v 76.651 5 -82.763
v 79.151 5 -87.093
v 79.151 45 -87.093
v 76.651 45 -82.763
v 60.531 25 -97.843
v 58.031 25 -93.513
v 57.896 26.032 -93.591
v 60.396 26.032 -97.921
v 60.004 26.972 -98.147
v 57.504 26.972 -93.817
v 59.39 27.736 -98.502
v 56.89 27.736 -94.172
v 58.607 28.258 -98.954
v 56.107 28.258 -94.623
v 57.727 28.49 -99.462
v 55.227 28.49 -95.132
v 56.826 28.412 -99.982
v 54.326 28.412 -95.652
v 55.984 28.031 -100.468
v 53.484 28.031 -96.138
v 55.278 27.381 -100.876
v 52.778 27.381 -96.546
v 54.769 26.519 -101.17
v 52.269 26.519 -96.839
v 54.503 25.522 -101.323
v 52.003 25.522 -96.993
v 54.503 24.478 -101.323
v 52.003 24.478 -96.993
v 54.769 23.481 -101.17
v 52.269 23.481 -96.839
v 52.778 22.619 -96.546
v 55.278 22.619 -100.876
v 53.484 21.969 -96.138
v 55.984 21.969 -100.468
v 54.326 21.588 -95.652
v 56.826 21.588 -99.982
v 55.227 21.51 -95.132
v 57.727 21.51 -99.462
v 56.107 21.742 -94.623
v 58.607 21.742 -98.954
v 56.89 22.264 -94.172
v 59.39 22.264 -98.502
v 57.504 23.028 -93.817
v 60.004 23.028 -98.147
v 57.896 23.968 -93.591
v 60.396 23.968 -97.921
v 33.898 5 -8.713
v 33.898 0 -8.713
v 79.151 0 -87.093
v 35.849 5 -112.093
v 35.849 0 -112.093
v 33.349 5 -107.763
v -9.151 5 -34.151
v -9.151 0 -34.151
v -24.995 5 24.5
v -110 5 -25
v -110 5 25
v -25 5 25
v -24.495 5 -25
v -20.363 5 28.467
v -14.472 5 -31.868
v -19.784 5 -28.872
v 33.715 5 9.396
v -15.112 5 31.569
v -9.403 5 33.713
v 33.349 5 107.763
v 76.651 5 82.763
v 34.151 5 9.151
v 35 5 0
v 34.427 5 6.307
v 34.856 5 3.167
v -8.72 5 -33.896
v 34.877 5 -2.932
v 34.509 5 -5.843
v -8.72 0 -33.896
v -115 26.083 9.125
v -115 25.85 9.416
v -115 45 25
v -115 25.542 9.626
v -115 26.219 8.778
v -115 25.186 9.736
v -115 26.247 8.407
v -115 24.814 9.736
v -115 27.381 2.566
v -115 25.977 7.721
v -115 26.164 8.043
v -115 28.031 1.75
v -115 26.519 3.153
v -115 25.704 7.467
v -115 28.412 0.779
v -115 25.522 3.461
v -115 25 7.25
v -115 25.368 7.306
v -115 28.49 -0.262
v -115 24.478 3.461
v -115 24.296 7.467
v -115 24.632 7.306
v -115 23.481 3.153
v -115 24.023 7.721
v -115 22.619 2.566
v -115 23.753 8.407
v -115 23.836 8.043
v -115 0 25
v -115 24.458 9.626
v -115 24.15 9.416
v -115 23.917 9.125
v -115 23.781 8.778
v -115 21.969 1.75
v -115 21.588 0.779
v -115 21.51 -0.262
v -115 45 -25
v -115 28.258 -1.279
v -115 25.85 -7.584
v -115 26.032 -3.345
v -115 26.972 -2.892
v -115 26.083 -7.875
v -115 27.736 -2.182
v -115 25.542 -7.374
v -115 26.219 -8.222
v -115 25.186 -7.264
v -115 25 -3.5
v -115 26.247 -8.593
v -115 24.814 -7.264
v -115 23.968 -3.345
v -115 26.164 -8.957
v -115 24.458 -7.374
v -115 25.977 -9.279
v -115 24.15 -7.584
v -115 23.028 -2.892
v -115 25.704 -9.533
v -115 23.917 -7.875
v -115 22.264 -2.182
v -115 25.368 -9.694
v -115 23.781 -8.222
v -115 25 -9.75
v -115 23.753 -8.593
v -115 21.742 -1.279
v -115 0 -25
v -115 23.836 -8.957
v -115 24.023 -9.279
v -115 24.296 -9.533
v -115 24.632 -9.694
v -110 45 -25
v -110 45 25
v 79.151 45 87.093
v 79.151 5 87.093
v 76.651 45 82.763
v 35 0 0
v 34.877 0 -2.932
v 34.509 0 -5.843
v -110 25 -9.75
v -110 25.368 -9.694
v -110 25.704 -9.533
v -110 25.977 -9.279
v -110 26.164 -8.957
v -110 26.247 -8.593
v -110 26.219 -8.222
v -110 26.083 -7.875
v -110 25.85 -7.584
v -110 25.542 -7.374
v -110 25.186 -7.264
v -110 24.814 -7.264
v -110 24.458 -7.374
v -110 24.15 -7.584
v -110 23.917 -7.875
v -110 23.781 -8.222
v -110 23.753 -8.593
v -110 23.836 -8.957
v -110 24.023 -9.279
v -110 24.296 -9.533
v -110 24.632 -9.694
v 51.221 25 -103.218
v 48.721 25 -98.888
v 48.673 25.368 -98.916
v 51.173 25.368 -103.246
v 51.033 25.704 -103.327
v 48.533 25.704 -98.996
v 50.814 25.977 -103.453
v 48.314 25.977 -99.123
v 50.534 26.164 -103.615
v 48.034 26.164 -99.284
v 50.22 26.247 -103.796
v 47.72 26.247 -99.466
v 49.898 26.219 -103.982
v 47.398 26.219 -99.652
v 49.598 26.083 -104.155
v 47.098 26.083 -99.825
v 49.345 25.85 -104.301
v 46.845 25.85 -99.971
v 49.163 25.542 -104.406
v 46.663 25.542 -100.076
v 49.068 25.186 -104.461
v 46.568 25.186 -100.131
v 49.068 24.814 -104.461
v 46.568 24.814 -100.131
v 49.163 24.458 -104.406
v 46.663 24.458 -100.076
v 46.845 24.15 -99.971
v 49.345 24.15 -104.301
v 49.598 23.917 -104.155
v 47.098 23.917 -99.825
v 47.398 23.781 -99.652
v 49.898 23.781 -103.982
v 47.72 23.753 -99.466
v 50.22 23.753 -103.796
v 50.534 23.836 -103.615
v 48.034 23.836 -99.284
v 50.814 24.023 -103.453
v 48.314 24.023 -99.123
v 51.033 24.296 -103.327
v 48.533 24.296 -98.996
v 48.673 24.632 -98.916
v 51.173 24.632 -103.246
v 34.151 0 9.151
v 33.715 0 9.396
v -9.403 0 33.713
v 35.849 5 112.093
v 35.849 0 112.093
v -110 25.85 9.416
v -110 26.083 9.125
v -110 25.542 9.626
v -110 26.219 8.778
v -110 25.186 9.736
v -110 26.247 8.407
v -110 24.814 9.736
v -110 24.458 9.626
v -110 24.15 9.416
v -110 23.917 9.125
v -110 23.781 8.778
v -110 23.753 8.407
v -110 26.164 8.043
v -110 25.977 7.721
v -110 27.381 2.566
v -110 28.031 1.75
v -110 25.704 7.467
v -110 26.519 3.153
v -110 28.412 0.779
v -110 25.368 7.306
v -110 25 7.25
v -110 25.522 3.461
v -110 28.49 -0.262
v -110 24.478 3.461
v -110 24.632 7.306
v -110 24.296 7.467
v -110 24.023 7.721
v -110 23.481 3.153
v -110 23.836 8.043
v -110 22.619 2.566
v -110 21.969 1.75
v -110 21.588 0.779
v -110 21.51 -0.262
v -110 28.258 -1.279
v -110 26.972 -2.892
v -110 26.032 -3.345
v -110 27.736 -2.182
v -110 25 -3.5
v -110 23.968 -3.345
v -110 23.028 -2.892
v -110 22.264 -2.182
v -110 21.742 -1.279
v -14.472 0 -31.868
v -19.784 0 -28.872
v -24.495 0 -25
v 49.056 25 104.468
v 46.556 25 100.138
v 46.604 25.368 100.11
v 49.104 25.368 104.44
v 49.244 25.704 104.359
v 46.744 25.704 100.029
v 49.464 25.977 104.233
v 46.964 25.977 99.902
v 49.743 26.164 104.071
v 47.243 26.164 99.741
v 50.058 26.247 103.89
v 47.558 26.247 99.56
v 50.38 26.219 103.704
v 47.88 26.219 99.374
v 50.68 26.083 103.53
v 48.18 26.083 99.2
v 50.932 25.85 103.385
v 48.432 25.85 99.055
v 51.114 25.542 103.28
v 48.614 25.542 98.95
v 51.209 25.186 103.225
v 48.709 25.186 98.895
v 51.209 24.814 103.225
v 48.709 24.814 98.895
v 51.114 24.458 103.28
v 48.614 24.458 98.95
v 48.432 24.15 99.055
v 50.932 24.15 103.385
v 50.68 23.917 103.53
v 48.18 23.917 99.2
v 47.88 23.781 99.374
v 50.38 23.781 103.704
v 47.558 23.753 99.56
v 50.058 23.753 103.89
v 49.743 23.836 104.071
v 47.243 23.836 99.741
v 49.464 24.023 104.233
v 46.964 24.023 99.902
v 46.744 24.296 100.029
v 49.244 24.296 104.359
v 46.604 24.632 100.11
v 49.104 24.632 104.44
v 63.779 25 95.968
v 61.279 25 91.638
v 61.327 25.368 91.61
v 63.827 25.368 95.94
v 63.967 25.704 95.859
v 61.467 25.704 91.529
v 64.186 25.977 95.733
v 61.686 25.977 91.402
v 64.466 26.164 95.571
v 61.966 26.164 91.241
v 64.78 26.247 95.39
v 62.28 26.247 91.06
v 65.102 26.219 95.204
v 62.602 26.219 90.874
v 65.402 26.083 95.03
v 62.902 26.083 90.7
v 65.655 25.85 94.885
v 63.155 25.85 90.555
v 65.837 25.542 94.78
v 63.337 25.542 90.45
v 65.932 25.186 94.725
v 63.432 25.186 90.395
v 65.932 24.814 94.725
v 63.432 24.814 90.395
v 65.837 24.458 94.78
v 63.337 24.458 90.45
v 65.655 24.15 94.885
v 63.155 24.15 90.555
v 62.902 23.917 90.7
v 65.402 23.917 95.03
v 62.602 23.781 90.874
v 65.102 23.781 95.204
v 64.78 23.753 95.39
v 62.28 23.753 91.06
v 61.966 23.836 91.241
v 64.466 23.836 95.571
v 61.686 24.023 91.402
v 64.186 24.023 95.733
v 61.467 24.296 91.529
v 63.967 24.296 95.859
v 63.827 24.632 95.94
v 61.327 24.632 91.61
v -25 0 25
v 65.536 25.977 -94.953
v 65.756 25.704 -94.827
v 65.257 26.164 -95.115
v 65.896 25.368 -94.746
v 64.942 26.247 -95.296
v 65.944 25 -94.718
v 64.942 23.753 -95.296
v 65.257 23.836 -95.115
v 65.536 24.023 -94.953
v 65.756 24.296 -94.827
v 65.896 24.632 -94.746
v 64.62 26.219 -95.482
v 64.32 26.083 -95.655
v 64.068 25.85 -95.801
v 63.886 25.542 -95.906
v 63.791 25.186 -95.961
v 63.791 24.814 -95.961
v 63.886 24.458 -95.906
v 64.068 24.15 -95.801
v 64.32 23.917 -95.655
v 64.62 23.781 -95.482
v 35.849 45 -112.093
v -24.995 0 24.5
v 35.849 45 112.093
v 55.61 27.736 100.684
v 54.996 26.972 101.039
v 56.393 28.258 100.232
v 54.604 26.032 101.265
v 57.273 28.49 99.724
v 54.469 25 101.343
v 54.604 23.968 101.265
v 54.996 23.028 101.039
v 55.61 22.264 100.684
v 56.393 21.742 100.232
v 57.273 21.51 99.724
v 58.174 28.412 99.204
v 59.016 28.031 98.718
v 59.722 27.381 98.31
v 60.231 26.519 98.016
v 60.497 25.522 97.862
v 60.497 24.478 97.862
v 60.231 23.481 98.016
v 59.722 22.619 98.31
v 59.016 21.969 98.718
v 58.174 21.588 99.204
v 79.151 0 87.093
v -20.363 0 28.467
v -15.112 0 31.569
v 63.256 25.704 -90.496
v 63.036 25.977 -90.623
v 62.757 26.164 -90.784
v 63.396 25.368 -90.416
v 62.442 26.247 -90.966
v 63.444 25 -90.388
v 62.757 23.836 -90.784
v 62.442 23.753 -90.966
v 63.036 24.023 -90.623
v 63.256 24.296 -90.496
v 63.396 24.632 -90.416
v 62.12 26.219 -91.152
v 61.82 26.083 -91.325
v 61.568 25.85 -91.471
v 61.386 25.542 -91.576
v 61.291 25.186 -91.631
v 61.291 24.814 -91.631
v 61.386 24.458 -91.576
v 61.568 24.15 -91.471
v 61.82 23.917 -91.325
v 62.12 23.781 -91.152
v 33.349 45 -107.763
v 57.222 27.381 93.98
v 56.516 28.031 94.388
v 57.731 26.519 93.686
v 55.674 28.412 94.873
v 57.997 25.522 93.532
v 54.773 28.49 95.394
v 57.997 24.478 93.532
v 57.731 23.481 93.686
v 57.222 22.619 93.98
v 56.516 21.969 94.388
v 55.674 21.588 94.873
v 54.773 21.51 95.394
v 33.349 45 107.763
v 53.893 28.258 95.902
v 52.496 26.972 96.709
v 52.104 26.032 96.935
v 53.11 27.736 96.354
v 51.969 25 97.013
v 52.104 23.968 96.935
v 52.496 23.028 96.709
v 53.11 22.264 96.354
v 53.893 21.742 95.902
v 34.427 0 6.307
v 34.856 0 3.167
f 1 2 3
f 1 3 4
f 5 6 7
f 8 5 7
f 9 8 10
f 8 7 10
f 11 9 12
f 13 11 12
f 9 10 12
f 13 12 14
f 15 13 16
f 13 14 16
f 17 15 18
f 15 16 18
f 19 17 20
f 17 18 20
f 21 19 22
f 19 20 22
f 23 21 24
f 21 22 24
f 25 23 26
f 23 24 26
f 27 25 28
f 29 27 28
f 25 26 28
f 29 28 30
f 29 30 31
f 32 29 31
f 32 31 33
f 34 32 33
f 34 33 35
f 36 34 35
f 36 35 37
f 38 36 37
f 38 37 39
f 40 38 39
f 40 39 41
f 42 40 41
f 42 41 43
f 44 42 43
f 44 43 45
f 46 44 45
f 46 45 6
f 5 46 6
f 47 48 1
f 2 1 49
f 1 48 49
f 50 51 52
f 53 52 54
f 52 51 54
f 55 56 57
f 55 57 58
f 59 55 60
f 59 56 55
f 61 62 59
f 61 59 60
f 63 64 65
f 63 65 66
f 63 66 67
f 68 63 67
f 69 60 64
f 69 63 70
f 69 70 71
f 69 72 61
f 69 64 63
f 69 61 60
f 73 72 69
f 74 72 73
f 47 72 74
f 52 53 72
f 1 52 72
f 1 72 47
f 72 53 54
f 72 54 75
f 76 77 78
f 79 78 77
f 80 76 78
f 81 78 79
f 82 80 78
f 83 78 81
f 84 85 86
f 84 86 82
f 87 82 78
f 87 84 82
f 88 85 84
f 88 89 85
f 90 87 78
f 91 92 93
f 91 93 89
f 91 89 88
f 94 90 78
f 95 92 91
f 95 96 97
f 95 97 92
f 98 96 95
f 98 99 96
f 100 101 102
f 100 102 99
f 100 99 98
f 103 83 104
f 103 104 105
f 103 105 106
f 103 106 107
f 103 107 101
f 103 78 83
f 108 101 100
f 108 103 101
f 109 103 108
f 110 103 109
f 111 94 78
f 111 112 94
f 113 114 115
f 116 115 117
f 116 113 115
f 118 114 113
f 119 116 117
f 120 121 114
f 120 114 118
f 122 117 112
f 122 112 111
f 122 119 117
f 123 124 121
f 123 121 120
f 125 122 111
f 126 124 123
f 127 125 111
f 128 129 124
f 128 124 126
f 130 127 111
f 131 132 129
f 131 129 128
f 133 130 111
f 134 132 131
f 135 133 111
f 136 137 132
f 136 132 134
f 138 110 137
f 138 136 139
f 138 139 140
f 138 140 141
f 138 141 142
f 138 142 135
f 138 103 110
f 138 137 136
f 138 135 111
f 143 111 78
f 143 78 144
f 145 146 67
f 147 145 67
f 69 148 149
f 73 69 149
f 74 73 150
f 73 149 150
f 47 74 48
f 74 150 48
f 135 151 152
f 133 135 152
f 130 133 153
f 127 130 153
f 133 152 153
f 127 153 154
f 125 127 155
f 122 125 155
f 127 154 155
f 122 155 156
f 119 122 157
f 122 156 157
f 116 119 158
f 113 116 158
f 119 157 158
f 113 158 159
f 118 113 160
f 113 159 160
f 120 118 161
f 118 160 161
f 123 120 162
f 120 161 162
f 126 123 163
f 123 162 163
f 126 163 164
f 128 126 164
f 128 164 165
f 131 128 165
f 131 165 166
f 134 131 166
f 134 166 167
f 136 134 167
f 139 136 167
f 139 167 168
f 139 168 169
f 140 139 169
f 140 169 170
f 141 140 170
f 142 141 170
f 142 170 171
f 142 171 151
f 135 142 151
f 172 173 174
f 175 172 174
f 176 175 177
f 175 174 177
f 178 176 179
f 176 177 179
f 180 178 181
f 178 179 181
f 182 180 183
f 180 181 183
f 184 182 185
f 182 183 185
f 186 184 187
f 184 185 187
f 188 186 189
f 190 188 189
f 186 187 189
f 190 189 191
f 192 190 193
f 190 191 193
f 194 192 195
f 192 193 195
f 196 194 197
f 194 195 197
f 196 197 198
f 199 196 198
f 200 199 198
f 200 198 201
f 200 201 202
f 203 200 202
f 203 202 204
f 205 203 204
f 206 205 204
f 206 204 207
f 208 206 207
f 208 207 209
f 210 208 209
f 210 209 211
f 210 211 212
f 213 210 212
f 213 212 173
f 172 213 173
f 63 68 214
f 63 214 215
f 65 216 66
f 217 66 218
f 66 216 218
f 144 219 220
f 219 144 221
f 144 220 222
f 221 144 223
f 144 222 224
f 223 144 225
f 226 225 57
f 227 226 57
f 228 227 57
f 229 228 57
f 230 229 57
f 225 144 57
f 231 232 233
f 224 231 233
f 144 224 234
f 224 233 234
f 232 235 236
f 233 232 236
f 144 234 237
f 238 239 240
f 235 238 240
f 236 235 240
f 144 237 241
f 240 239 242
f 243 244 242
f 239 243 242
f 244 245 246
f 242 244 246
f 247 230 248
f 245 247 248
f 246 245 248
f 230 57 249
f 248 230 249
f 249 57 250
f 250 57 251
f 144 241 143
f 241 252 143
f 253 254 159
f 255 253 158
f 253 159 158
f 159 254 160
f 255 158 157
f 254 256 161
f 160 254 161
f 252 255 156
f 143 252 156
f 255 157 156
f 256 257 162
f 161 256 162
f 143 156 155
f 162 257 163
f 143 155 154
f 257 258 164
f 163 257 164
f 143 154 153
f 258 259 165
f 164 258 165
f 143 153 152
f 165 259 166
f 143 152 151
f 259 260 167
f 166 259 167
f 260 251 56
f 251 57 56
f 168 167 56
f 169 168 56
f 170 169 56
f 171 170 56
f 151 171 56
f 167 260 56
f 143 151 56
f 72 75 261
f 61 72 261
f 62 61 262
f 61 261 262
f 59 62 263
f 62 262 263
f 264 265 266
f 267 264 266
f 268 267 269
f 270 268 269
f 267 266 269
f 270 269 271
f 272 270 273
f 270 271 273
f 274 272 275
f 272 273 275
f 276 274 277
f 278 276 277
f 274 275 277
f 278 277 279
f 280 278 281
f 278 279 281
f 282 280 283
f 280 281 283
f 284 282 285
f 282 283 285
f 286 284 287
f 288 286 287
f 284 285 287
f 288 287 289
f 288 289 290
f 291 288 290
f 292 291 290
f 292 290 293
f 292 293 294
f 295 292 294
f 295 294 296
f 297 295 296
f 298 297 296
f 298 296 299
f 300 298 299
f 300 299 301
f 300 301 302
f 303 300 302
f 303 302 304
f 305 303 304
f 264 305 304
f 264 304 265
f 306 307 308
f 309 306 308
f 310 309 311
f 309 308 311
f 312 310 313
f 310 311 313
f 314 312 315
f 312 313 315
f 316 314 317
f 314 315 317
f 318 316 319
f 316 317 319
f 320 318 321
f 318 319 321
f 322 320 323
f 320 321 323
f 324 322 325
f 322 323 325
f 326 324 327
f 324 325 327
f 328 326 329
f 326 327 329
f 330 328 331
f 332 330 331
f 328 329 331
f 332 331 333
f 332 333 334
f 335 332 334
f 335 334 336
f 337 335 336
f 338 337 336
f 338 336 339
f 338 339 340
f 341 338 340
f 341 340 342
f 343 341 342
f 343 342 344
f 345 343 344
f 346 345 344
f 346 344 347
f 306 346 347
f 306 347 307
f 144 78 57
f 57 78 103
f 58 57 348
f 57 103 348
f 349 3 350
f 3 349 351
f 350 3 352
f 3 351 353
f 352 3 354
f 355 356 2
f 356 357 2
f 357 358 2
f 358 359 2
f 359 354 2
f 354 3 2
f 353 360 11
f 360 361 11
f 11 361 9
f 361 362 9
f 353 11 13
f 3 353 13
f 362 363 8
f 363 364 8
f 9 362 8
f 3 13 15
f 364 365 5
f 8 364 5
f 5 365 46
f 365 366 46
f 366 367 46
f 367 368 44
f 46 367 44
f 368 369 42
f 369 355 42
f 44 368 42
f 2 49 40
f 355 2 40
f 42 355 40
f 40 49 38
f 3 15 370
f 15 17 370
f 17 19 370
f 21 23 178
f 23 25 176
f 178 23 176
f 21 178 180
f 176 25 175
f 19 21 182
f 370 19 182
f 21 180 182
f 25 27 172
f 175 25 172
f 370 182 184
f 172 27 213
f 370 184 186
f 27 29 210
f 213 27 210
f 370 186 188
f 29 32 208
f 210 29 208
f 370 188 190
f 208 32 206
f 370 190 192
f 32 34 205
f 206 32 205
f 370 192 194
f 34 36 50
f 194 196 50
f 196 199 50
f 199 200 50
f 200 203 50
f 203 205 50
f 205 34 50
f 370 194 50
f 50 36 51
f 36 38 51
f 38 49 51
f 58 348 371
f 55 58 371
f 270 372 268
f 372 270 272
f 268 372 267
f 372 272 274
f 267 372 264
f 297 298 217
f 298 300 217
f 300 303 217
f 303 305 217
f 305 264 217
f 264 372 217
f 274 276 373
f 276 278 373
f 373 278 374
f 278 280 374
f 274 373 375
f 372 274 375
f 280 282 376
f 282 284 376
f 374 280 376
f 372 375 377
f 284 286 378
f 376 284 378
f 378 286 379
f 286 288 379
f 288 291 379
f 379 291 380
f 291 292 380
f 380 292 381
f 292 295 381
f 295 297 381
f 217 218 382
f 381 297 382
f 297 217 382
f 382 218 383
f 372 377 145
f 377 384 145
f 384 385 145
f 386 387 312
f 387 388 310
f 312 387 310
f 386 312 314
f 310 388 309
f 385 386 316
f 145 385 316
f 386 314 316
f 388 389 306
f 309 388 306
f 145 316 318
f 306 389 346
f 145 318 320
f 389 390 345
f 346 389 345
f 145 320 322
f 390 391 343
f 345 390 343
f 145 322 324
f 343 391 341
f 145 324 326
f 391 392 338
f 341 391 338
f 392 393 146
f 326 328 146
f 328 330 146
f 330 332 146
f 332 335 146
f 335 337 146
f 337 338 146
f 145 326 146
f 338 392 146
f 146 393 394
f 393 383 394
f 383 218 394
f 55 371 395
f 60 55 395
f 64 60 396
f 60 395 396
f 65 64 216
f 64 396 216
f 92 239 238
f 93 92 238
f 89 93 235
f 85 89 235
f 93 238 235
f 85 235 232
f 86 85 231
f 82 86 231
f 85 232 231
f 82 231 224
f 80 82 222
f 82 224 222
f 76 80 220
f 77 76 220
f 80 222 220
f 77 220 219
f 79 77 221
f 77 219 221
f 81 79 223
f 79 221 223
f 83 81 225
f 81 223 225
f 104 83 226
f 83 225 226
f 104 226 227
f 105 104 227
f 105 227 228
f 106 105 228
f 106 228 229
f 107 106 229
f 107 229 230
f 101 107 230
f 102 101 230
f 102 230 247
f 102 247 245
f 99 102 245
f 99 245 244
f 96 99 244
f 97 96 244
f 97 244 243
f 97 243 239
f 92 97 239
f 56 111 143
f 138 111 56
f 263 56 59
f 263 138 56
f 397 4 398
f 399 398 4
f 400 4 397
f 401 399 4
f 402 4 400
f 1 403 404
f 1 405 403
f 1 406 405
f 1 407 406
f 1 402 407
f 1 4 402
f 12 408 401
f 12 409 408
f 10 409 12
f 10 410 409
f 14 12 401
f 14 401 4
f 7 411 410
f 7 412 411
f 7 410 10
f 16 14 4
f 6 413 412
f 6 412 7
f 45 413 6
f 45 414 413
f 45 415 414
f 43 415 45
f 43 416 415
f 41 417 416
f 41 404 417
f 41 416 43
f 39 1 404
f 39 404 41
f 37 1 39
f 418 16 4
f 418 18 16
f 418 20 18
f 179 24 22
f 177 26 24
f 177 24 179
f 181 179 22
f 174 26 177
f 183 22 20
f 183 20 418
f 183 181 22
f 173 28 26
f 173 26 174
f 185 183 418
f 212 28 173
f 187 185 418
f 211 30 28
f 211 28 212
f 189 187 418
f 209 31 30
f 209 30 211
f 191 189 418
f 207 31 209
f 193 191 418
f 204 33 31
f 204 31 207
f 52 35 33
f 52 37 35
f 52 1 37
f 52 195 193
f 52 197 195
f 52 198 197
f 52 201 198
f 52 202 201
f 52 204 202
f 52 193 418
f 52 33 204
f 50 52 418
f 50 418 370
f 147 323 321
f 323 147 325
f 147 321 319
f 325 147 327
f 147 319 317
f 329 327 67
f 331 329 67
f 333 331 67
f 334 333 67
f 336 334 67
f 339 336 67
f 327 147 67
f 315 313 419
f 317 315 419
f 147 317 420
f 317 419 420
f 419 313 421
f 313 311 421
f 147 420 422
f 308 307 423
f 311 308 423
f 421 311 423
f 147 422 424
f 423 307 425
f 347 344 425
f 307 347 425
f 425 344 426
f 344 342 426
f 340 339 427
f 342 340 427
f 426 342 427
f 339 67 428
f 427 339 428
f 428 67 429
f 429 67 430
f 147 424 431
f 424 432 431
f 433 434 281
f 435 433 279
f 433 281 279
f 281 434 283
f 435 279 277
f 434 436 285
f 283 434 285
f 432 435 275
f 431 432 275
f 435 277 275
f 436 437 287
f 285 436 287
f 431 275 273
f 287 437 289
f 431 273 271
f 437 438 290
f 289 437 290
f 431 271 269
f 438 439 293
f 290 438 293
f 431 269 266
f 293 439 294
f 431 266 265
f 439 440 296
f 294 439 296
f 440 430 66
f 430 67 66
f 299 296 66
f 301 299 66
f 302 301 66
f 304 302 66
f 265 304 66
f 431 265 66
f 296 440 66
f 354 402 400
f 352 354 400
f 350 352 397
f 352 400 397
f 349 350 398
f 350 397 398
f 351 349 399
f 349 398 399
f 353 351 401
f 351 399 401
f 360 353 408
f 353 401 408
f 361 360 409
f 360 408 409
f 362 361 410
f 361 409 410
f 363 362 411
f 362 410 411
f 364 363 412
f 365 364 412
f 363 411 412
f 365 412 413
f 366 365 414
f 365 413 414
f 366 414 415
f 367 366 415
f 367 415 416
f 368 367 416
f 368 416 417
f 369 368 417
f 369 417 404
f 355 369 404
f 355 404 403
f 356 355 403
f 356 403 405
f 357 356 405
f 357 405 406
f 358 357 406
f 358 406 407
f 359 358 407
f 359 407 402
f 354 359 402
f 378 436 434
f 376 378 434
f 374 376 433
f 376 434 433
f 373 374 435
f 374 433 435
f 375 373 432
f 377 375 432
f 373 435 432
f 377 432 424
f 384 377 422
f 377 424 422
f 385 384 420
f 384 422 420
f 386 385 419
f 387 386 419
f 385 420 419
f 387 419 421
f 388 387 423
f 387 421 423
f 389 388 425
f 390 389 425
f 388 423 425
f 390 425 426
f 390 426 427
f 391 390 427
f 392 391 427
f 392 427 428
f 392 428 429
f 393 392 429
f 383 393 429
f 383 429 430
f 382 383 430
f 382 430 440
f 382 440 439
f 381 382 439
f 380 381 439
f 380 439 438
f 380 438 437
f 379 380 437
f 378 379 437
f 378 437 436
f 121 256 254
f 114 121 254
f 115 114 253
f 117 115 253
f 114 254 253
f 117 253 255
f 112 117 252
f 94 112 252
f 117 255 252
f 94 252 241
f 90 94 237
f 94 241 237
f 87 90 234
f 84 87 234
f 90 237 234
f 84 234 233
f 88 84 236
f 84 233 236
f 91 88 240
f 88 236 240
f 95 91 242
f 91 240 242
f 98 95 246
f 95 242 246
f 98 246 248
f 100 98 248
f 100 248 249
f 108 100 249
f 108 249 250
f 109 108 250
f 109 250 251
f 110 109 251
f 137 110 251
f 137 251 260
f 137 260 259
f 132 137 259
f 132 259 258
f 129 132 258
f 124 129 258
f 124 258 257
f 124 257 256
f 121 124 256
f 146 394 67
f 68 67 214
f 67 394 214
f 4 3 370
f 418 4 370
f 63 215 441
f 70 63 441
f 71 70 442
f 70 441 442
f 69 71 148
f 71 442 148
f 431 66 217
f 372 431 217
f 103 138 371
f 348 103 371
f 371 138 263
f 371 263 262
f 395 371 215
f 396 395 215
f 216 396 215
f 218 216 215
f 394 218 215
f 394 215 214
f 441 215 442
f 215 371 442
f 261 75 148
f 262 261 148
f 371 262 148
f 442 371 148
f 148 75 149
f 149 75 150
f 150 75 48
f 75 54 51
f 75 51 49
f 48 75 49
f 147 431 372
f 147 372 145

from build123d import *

# Parameters (mm, degrees)
BOSS_EXTRU_3_DEPTH      = 5
ESQUISSE4_W             = 5
ESQUISSE4_H             = 50
BOSS_EXTRU_4_DEPTH      = 40
ESQUISSE5_R             = 3.5
ESQUISSE5_R_2           = 1.25
ENL_V_MAT_EXTRU_1_DEPTH = 225.427684996
ESQUISSE6_R             = 3.5
ESQUISSE6_R_2           = 1.25
ENL_V_MAT_EXTRU_2_DEPTH = 272.884889055
ESQUISSE7_R             = 3.5
ESQUISSE7_R_2           = 1.25
ENL_V_MAT_EXTRU_3_DEPTH = 272.884889055


with BuildPart() as part:
    # Esquisse3 → Boss.-Extru.3 (new body)
    with BuildSketch(Plane(origin=(0, 0, 0), x_dir=(1, 0, 0), z_dir=(0, 1, 0))):
        with BuildLine():
            Line((-115, -25), (-25, -25))
            Line((-25, -25), (-24.99494949, -24.500051021))
            ThreePointArc((-24.99494949, -24.500051021), (-17.805293657, -30.132565736), (-9.403186381, -33.713203436))
            Line((-9.403186381, -33.713203436), (35.849364905, -112.092921435))
            Line((35.849364905, -112.092921435), (79.150635095, -87.092921435))
            Line((79.150635095, -87.092921435), (34.150635095, -9.150635095))
            Line((34.150635095, -9.150635095), (33.715141323, -9.396235714))
            ThreePointArc((33.715141323, -9.396235714), (34.998214236, -0.353553761), (33.898083809, 8.713203436))
            Line((33.898083809, 8.713203436), (79.150635095, 87.092921435))
            Line((79.150635095, 87.092921435), (35.849364905, 112.092921435))
            Line((35.849364905, 112.092921435), (-9.150635095, 34.150635095))
            Line((-9.150635095, 34.150635095), (-8.720191833, 33.896286735))
            ThreePointArc((-8.720191833, 33.896286735), (-17.19292058, 30.486119496), (-24.494897428, 25))
            Line((-24.494897428, 25), (-115, 25))
            Line((-115, 25), (-115, -25))
        make_face()
    extrude(amount=BOSS_EXTRU_3_DEPTH)

    # Esquisse4 → Boss.-Extru.4 (add)
    with BuildSketch(Plane(origin=(0, 5, 0), x_dir=(1, 0, 0), z_dir=(0, 1, 0))):
        with Locations((-112.5, 0)):
            Rectangle(ESQUISSE4_W, ESQUISSE4_H)
        Polygon((35.849364905, 112.092921435), (79.150635095, 87.092921435), (76.650635095, 82.762794416), (33.349364905, 107.762794416), align=None)
        Polygon((79.150635095, -87.092921435), (76.650635095, -82.762794416), (33.349364905, -107.762794416), (35.849364905, -112.092921435), align=None)
    extrude(amount=BOSS_EXTRU_4_DEPTH)

    # Esquisse5 → Enlèv. mat.-Extru.1 (cut, through all)
    with BuildSketch(Plane(origin=(-110, 0, 0), x_dir=(0, 0, -1), z_dir=(1, 0, 0))):
        with Locations((0, 25)):
            Circle(ESQUISSE5_R)
        with Locations((-8.5, 25)):
            Circle(ESQUISSE5_R_2)
        with Locations((8.5, 25)):
            Circle(ESQUISSE5_R_2)
    extrude(amount=-ENL_V_MAT_EXTRU_1_DEPTH, mode=Mode.SUBTRACT)

    # Esquisse6 → Enlèv. mat.-Extru.2 (cut, through all)
    with BuildSketch(Plane(origin=(55, 0, 95.262794416), x_dir=(-0.8660254037844386, 0, 0.4999999999999999), z_dir=(-0.49999999999999994, 0, -0.8660254037844387))):
        with Locations((0, 25)):
            Circle(ESQUISSE6_R)
        with Locations((-8.5, 25)):
            Circle(ESQUISSE6_R_2)
        with Locations((8.5, 25)):
            Circle(ESQUISSE6_R_2)
    extrude(amount=-ENL_V_MAT_EXTRU_2_DEPTH, mode=Mode.SUBTRACT)

    # Esquisse7 → Enlèv. mat.-Extru.3 (cut, through all)
    with BuildSketch(Plane(origin=(55, 0, -95.262794416), x_dir=(0.8660254037844388, 0, 0.49999999999999983), z_dir=(-0.4999999999999998, 0, 0.8660254037844387))):
        with Locations((0, 25)):
            Circle(ESQUISSE7_R)
        with Locations((8.5, 25)):
            Circle(ESQUISSE7_R_2)
        with Locations((-8.5, 25)):
            Circle(ESQUISSE7_R_2)
    extrude(amount=-ENL_V_MAT_EXTRU_3_DEPTH, mode=Mode.SUBTRACT)


solid = part.part
